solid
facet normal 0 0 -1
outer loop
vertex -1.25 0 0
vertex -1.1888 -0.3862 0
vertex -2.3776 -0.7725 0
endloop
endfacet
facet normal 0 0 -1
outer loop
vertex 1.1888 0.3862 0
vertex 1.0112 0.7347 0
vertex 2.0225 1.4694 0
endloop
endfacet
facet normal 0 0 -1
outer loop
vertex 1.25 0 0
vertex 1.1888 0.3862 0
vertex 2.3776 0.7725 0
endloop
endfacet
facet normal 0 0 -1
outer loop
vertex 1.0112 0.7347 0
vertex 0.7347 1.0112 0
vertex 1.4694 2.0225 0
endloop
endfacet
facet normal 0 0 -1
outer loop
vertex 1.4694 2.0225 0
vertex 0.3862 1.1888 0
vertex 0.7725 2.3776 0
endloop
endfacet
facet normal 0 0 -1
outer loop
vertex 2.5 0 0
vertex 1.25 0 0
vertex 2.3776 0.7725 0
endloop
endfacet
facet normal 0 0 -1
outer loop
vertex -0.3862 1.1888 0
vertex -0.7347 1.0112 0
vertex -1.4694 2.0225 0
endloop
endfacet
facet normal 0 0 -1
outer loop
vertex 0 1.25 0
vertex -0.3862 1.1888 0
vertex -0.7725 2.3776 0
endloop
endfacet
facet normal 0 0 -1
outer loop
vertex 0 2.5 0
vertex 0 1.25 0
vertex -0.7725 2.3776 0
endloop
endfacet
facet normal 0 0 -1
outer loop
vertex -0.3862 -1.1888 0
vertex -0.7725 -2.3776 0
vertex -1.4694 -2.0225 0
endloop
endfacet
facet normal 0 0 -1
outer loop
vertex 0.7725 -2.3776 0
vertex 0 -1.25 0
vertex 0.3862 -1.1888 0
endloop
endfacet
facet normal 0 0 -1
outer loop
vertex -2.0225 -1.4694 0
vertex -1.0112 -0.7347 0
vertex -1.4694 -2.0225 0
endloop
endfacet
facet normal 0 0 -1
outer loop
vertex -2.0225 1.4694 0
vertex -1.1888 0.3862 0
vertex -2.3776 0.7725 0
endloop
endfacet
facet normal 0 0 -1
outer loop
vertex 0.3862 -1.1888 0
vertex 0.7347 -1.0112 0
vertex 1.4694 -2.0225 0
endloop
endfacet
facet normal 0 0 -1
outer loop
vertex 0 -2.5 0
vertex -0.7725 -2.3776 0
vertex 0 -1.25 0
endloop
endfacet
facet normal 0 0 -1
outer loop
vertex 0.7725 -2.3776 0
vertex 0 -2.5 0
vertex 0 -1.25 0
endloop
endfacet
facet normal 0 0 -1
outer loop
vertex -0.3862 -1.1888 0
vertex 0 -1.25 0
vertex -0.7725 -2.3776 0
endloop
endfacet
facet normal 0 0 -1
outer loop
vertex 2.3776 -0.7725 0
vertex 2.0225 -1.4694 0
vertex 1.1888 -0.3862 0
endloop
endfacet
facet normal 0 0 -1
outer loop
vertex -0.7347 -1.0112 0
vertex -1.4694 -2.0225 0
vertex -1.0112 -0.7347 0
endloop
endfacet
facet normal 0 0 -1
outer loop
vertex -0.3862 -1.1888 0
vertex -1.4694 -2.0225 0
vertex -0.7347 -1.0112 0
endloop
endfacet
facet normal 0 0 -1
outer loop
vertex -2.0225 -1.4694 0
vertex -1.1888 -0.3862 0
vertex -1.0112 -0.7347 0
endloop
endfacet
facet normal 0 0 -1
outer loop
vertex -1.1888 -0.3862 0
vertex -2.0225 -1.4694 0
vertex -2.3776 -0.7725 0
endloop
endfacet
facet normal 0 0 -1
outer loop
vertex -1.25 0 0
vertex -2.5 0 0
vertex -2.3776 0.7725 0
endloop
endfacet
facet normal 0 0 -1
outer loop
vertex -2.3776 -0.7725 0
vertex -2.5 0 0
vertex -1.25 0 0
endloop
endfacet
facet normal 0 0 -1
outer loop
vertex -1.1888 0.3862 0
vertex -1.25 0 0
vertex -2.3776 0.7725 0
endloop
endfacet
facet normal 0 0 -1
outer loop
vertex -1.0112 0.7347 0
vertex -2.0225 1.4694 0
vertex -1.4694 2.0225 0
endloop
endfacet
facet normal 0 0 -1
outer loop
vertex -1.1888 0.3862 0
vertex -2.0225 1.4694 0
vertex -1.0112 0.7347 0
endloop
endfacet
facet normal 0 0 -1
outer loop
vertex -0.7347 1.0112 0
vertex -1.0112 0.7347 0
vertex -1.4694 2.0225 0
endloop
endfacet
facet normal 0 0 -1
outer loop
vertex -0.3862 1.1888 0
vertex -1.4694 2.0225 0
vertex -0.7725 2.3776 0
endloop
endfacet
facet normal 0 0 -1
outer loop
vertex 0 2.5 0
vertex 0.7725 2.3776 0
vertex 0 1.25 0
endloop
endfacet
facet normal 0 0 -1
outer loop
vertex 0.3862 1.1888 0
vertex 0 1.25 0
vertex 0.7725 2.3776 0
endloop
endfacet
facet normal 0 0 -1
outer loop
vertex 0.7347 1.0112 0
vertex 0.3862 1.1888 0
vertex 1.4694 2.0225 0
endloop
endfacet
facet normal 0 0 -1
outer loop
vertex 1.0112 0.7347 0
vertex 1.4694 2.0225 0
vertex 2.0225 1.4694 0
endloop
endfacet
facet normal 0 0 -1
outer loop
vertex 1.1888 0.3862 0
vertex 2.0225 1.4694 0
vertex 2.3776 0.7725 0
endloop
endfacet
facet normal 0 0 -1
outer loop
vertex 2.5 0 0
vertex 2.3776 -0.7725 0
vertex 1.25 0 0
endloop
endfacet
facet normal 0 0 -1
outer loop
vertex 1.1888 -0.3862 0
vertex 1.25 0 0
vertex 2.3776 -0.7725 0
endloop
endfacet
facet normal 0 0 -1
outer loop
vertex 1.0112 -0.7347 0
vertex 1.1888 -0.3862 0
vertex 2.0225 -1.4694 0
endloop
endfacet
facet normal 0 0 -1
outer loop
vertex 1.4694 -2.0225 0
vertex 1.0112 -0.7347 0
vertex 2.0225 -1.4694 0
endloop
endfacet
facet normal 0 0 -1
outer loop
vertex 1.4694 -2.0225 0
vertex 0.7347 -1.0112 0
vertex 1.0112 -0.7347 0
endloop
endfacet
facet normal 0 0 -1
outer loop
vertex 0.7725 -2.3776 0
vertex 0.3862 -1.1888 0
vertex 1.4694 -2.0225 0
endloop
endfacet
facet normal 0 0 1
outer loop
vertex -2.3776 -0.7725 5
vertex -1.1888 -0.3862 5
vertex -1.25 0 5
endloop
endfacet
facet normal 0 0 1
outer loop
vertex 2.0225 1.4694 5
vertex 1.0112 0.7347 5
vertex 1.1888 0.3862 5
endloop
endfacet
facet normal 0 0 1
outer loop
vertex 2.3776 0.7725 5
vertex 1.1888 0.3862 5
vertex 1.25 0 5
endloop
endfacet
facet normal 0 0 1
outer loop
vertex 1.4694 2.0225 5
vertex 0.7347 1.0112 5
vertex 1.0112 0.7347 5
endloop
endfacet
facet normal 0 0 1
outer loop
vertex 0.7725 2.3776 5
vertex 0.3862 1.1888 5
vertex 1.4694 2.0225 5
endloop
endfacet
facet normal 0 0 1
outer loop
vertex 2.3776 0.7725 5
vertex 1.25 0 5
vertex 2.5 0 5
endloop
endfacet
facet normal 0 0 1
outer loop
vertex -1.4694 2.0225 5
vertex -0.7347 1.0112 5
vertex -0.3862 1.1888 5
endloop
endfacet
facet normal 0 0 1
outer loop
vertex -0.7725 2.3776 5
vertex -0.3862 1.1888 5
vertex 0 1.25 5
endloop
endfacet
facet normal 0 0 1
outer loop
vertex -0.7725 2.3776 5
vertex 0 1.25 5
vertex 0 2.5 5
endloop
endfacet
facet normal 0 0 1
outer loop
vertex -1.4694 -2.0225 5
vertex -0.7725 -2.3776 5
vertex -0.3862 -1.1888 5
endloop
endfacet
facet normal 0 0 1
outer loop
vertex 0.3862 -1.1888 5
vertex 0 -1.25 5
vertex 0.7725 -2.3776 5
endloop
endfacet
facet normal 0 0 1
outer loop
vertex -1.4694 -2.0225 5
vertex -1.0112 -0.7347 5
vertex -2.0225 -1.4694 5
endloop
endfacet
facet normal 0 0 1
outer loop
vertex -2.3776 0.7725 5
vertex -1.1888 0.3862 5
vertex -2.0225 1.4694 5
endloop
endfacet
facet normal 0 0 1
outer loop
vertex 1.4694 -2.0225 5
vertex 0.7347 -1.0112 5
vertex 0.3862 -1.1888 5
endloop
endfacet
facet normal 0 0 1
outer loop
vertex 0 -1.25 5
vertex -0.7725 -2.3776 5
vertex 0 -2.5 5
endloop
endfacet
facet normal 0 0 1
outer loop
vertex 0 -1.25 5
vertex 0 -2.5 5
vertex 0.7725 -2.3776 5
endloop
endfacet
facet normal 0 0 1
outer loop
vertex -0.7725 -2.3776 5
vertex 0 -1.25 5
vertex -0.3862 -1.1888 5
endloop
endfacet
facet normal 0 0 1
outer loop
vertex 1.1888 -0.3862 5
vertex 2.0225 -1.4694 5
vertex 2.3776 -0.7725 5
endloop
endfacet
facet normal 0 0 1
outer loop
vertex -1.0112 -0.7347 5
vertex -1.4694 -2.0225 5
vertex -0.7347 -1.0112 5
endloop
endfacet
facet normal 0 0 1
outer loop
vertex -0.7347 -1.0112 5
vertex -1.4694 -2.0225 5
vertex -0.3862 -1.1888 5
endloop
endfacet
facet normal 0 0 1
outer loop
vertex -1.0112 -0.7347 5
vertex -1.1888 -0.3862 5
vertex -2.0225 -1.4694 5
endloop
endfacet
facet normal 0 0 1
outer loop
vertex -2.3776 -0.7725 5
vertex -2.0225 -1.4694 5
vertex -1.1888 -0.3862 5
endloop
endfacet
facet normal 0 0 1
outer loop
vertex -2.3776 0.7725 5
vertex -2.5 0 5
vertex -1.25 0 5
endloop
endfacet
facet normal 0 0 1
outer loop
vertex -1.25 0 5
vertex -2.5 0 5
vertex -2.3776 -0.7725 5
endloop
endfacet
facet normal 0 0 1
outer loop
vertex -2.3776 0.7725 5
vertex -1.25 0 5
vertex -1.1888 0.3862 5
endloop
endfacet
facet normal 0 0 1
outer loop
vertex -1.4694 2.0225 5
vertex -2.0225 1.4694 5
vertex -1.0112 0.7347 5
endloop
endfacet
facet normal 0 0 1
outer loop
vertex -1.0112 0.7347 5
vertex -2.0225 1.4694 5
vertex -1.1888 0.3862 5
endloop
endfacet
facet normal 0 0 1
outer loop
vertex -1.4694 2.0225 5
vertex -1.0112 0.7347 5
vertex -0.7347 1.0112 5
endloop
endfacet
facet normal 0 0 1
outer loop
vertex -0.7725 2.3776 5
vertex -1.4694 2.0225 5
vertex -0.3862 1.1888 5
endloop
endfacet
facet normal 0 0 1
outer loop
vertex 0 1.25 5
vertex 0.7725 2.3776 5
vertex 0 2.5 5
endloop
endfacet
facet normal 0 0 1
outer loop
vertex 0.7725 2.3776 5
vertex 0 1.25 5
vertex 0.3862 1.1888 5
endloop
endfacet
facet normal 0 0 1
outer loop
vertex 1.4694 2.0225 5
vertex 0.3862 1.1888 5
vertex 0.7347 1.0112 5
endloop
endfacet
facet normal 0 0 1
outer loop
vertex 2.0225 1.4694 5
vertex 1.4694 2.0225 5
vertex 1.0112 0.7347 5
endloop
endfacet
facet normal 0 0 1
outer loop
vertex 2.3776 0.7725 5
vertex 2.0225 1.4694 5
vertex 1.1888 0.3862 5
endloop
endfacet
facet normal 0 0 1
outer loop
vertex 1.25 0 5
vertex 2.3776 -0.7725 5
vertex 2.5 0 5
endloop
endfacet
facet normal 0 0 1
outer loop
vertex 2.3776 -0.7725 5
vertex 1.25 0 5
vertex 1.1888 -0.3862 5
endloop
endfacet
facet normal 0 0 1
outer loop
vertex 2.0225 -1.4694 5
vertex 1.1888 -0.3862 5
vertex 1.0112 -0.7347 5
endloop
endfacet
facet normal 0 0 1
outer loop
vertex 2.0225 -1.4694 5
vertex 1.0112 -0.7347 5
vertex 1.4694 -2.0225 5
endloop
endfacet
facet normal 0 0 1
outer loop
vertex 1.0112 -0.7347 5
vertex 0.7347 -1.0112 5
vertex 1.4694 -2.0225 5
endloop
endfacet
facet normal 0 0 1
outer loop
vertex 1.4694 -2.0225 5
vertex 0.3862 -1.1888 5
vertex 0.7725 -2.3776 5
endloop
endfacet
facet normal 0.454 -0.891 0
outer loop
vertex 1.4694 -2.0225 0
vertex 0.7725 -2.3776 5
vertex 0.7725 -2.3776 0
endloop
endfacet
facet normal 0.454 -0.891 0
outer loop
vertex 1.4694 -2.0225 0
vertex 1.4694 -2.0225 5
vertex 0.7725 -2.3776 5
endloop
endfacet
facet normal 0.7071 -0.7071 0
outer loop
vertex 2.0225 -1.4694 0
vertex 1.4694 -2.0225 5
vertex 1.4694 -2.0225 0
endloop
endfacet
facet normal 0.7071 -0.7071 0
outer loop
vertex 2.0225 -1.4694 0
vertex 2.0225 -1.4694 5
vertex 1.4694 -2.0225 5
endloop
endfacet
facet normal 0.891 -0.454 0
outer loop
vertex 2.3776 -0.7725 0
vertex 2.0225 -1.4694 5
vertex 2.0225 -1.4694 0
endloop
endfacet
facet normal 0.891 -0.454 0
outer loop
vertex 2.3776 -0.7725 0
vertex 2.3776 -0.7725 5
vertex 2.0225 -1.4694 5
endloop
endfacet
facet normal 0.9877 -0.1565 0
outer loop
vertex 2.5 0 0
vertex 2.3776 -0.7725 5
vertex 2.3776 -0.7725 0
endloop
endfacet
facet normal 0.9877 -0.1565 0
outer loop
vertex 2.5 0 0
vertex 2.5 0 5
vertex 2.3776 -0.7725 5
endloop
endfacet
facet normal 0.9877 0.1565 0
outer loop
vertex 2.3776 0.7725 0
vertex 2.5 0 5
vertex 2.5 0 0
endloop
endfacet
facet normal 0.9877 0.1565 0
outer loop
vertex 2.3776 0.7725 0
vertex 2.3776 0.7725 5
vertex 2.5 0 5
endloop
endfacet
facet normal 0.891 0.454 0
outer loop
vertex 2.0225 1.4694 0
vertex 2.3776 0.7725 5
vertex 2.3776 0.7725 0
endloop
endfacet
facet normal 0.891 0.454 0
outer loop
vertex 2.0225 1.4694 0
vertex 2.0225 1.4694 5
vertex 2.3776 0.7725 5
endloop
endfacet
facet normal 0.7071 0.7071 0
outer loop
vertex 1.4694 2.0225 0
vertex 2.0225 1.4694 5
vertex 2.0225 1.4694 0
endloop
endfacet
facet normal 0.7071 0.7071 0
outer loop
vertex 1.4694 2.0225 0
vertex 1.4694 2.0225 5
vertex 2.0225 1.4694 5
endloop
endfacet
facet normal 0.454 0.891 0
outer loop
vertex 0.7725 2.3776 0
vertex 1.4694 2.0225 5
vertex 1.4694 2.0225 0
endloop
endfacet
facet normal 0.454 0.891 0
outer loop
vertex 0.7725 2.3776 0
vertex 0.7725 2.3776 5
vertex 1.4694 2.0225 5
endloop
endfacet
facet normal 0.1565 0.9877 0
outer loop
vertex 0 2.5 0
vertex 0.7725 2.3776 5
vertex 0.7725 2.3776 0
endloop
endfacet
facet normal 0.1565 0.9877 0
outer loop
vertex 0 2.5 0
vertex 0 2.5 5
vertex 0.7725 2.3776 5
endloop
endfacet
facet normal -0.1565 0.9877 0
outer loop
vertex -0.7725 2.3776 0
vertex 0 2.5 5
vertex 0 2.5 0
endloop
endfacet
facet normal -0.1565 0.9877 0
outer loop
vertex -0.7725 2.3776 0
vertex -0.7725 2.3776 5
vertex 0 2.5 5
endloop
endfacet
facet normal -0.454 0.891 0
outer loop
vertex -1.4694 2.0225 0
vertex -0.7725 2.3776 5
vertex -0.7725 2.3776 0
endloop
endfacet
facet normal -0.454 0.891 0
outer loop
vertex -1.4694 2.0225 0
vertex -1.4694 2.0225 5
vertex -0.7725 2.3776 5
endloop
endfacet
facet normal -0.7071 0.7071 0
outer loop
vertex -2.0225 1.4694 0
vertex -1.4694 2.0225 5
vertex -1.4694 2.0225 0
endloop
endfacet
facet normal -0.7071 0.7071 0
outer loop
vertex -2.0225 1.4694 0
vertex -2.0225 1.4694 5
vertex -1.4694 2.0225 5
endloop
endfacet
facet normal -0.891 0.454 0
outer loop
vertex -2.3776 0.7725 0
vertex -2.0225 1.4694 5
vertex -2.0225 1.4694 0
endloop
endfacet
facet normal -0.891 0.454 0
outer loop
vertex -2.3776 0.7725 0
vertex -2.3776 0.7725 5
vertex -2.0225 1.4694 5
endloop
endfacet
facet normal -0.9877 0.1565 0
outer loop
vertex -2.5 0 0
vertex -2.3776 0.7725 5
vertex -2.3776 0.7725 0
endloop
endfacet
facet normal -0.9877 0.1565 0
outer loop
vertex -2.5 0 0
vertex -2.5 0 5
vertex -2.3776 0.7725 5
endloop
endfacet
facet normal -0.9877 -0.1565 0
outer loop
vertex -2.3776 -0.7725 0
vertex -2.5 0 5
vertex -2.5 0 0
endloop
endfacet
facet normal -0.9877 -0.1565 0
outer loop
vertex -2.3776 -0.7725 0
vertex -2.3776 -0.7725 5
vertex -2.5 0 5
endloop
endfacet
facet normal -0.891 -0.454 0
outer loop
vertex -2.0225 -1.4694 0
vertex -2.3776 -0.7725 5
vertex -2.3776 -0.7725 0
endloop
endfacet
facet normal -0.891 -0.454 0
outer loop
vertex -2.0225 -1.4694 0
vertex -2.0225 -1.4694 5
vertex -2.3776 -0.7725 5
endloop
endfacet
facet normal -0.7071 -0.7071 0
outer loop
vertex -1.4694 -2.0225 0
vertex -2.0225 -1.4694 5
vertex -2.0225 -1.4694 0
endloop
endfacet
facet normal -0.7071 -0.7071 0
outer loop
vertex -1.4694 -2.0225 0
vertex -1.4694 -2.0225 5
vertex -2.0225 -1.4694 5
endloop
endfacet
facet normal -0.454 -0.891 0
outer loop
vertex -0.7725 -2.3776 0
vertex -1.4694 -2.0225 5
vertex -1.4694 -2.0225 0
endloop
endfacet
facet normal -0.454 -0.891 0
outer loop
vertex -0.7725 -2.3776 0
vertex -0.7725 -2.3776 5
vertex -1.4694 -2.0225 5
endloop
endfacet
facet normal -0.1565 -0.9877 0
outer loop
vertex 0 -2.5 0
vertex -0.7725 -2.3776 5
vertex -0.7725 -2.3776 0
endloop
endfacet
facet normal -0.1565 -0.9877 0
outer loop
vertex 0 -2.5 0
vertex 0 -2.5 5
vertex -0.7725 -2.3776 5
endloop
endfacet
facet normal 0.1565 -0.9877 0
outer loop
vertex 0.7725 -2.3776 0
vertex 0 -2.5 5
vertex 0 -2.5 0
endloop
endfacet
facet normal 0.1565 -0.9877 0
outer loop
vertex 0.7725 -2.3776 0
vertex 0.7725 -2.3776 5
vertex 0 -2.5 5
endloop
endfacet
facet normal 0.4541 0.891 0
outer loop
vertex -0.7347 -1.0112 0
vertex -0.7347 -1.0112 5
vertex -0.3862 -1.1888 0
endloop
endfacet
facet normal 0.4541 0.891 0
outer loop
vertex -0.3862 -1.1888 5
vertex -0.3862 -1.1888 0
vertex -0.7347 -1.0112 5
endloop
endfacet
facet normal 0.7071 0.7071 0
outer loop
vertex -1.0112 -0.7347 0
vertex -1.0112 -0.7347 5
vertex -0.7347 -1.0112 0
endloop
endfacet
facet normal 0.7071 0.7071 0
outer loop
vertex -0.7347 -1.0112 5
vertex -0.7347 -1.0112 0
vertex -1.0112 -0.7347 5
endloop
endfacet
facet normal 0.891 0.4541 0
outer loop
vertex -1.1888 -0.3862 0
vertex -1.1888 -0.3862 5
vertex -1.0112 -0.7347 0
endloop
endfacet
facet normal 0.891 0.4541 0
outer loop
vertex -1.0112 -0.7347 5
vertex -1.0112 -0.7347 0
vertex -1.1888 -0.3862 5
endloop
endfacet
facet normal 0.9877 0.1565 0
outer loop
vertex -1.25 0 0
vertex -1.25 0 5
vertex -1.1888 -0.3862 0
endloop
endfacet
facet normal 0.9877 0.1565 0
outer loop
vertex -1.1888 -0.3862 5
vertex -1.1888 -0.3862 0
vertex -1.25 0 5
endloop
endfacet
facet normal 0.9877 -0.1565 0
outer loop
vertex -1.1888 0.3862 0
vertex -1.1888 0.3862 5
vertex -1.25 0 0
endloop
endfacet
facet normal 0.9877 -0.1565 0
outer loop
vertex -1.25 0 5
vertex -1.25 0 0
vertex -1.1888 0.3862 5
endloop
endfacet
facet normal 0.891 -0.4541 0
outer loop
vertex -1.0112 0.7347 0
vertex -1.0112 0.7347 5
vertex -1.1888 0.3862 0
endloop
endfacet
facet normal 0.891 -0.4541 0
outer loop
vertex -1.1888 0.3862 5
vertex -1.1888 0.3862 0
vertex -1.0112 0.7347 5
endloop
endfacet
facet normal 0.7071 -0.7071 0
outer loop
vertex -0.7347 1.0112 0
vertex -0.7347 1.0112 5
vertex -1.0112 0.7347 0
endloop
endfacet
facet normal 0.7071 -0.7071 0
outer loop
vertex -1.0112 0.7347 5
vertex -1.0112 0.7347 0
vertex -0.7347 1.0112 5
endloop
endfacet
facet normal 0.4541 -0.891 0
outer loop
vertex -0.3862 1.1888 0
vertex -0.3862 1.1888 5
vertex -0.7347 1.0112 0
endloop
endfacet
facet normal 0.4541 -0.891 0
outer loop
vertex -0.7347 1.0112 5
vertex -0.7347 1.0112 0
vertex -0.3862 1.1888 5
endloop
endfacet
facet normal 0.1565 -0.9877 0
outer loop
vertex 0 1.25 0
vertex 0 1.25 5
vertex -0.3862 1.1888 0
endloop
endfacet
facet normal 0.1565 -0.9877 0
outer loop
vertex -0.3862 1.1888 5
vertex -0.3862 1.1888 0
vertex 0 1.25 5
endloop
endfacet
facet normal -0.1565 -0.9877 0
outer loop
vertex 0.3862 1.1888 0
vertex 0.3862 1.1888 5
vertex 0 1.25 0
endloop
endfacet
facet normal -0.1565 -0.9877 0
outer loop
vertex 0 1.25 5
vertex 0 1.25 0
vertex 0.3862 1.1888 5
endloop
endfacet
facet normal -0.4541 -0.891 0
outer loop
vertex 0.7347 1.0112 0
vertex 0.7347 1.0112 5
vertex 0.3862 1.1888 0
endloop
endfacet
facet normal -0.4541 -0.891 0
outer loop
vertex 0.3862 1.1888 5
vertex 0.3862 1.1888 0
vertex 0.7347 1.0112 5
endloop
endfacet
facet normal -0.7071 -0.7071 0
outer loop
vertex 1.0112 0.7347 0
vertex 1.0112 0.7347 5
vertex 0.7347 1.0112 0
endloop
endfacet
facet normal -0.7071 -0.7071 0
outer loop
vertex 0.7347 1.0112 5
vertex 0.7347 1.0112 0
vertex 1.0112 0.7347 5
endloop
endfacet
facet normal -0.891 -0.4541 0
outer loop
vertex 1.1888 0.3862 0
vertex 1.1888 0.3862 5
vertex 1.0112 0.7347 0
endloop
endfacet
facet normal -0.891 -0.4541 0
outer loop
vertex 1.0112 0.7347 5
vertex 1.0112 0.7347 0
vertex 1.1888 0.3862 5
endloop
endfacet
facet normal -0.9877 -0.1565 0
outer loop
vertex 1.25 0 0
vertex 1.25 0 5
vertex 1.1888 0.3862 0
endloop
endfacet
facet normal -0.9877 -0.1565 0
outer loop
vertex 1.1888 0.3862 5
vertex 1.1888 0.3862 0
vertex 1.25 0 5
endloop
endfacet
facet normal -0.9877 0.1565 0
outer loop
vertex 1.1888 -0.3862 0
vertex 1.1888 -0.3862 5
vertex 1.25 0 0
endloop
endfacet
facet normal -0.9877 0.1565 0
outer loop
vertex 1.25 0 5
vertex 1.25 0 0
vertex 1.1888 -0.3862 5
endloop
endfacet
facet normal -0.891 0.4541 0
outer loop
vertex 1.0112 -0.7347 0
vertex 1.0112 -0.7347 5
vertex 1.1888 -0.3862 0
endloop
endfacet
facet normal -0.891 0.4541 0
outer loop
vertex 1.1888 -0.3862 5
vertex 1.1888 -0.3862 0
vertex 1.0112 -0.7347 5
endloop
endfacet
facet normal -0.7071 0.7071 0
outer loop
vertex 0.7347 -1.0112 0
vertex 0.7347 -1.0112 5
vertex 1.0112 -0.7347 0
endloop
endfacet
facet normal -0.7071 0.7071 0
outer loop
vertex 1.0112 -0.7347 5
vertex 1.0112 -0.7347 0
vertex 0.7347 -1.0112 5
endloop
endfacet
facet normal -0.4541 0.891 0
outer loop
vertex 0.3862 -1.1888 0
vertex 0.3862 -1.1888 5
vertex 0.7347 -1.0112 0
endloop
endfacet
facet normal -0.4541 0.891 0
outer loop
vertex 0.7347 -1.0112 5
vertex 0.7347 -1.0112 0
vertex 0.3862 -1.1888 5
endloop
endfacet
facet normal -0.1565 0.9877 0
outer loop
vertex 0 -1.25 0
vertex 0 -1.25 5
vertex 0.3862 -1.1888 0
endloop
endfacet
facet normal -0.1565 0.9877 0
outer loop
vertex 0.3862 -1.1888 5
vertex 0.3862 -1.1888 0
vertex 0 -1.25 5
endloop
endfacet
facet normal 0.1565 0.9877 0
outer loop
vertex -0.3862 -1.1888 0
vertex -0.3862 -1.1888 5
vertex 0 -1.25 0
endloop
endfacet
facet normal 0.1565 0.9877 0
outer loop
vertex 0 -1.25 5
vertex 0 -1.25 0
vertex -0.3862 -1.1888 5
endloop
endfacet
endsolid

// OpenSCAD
linear_extrude(height = 5.0, twist = 0.0, scale = 1.0, slices = 1, center = false)
{
    difference()
    {
        scale([5.0, 5.0])
        {
            M44();
        }
        scale([2.5, 2.5])
        {
            M44();
        }
    }
}

module M44()
{
    polygon
    (
        points =
        [
            [0.5, 0.0], 
            [0.47552825814757677, 0.1545084971874737], 
            [0.4045084971874737, 0.29389262614623657], 
            [0.2938926261462365, 0.4045084971874737], 
            [0.15450849718747373, 0.47552825814757677], 
            [3.061616997868383E-17, 0.5], 
            [-0.15450849718747378, 0.47552825814757677], 
            [-0.2938926261462365, 0.4045084971874737], 
            [-0.40450849718747367, 0.2938926261462366], 
            [-0.47552825814757677, 0.15450849718747375], 
            [-0.5, 6.123233995736766E-17], 
            [-0.47552825814757677, -0.15450849718747386], 
            [-0.4045084971874736, -0.2938926261462367], 
            [-0.2938926261462366, -0.40450849718747367], 
            [-0.15450849718747378, -0.47552825814757677], 
            [-9.184850993605148E-17, -0.5], 
            [0.15450849718747361, -0.4755282581475768], 
            [0.29389262614623685, -0.4045084971874735], 
            [0.40450849718747367, -0.2938926261462367], 
            [0.47552825814757677, -0.1545084971874738]
        ],
        paths =
        [
            [0, 1, 2, 3, 4, 5, 6, 7, 8, 9, 10, 11, 12, 13, 14, 15, 16, 17, 18, 19]
        ]
    );
}
